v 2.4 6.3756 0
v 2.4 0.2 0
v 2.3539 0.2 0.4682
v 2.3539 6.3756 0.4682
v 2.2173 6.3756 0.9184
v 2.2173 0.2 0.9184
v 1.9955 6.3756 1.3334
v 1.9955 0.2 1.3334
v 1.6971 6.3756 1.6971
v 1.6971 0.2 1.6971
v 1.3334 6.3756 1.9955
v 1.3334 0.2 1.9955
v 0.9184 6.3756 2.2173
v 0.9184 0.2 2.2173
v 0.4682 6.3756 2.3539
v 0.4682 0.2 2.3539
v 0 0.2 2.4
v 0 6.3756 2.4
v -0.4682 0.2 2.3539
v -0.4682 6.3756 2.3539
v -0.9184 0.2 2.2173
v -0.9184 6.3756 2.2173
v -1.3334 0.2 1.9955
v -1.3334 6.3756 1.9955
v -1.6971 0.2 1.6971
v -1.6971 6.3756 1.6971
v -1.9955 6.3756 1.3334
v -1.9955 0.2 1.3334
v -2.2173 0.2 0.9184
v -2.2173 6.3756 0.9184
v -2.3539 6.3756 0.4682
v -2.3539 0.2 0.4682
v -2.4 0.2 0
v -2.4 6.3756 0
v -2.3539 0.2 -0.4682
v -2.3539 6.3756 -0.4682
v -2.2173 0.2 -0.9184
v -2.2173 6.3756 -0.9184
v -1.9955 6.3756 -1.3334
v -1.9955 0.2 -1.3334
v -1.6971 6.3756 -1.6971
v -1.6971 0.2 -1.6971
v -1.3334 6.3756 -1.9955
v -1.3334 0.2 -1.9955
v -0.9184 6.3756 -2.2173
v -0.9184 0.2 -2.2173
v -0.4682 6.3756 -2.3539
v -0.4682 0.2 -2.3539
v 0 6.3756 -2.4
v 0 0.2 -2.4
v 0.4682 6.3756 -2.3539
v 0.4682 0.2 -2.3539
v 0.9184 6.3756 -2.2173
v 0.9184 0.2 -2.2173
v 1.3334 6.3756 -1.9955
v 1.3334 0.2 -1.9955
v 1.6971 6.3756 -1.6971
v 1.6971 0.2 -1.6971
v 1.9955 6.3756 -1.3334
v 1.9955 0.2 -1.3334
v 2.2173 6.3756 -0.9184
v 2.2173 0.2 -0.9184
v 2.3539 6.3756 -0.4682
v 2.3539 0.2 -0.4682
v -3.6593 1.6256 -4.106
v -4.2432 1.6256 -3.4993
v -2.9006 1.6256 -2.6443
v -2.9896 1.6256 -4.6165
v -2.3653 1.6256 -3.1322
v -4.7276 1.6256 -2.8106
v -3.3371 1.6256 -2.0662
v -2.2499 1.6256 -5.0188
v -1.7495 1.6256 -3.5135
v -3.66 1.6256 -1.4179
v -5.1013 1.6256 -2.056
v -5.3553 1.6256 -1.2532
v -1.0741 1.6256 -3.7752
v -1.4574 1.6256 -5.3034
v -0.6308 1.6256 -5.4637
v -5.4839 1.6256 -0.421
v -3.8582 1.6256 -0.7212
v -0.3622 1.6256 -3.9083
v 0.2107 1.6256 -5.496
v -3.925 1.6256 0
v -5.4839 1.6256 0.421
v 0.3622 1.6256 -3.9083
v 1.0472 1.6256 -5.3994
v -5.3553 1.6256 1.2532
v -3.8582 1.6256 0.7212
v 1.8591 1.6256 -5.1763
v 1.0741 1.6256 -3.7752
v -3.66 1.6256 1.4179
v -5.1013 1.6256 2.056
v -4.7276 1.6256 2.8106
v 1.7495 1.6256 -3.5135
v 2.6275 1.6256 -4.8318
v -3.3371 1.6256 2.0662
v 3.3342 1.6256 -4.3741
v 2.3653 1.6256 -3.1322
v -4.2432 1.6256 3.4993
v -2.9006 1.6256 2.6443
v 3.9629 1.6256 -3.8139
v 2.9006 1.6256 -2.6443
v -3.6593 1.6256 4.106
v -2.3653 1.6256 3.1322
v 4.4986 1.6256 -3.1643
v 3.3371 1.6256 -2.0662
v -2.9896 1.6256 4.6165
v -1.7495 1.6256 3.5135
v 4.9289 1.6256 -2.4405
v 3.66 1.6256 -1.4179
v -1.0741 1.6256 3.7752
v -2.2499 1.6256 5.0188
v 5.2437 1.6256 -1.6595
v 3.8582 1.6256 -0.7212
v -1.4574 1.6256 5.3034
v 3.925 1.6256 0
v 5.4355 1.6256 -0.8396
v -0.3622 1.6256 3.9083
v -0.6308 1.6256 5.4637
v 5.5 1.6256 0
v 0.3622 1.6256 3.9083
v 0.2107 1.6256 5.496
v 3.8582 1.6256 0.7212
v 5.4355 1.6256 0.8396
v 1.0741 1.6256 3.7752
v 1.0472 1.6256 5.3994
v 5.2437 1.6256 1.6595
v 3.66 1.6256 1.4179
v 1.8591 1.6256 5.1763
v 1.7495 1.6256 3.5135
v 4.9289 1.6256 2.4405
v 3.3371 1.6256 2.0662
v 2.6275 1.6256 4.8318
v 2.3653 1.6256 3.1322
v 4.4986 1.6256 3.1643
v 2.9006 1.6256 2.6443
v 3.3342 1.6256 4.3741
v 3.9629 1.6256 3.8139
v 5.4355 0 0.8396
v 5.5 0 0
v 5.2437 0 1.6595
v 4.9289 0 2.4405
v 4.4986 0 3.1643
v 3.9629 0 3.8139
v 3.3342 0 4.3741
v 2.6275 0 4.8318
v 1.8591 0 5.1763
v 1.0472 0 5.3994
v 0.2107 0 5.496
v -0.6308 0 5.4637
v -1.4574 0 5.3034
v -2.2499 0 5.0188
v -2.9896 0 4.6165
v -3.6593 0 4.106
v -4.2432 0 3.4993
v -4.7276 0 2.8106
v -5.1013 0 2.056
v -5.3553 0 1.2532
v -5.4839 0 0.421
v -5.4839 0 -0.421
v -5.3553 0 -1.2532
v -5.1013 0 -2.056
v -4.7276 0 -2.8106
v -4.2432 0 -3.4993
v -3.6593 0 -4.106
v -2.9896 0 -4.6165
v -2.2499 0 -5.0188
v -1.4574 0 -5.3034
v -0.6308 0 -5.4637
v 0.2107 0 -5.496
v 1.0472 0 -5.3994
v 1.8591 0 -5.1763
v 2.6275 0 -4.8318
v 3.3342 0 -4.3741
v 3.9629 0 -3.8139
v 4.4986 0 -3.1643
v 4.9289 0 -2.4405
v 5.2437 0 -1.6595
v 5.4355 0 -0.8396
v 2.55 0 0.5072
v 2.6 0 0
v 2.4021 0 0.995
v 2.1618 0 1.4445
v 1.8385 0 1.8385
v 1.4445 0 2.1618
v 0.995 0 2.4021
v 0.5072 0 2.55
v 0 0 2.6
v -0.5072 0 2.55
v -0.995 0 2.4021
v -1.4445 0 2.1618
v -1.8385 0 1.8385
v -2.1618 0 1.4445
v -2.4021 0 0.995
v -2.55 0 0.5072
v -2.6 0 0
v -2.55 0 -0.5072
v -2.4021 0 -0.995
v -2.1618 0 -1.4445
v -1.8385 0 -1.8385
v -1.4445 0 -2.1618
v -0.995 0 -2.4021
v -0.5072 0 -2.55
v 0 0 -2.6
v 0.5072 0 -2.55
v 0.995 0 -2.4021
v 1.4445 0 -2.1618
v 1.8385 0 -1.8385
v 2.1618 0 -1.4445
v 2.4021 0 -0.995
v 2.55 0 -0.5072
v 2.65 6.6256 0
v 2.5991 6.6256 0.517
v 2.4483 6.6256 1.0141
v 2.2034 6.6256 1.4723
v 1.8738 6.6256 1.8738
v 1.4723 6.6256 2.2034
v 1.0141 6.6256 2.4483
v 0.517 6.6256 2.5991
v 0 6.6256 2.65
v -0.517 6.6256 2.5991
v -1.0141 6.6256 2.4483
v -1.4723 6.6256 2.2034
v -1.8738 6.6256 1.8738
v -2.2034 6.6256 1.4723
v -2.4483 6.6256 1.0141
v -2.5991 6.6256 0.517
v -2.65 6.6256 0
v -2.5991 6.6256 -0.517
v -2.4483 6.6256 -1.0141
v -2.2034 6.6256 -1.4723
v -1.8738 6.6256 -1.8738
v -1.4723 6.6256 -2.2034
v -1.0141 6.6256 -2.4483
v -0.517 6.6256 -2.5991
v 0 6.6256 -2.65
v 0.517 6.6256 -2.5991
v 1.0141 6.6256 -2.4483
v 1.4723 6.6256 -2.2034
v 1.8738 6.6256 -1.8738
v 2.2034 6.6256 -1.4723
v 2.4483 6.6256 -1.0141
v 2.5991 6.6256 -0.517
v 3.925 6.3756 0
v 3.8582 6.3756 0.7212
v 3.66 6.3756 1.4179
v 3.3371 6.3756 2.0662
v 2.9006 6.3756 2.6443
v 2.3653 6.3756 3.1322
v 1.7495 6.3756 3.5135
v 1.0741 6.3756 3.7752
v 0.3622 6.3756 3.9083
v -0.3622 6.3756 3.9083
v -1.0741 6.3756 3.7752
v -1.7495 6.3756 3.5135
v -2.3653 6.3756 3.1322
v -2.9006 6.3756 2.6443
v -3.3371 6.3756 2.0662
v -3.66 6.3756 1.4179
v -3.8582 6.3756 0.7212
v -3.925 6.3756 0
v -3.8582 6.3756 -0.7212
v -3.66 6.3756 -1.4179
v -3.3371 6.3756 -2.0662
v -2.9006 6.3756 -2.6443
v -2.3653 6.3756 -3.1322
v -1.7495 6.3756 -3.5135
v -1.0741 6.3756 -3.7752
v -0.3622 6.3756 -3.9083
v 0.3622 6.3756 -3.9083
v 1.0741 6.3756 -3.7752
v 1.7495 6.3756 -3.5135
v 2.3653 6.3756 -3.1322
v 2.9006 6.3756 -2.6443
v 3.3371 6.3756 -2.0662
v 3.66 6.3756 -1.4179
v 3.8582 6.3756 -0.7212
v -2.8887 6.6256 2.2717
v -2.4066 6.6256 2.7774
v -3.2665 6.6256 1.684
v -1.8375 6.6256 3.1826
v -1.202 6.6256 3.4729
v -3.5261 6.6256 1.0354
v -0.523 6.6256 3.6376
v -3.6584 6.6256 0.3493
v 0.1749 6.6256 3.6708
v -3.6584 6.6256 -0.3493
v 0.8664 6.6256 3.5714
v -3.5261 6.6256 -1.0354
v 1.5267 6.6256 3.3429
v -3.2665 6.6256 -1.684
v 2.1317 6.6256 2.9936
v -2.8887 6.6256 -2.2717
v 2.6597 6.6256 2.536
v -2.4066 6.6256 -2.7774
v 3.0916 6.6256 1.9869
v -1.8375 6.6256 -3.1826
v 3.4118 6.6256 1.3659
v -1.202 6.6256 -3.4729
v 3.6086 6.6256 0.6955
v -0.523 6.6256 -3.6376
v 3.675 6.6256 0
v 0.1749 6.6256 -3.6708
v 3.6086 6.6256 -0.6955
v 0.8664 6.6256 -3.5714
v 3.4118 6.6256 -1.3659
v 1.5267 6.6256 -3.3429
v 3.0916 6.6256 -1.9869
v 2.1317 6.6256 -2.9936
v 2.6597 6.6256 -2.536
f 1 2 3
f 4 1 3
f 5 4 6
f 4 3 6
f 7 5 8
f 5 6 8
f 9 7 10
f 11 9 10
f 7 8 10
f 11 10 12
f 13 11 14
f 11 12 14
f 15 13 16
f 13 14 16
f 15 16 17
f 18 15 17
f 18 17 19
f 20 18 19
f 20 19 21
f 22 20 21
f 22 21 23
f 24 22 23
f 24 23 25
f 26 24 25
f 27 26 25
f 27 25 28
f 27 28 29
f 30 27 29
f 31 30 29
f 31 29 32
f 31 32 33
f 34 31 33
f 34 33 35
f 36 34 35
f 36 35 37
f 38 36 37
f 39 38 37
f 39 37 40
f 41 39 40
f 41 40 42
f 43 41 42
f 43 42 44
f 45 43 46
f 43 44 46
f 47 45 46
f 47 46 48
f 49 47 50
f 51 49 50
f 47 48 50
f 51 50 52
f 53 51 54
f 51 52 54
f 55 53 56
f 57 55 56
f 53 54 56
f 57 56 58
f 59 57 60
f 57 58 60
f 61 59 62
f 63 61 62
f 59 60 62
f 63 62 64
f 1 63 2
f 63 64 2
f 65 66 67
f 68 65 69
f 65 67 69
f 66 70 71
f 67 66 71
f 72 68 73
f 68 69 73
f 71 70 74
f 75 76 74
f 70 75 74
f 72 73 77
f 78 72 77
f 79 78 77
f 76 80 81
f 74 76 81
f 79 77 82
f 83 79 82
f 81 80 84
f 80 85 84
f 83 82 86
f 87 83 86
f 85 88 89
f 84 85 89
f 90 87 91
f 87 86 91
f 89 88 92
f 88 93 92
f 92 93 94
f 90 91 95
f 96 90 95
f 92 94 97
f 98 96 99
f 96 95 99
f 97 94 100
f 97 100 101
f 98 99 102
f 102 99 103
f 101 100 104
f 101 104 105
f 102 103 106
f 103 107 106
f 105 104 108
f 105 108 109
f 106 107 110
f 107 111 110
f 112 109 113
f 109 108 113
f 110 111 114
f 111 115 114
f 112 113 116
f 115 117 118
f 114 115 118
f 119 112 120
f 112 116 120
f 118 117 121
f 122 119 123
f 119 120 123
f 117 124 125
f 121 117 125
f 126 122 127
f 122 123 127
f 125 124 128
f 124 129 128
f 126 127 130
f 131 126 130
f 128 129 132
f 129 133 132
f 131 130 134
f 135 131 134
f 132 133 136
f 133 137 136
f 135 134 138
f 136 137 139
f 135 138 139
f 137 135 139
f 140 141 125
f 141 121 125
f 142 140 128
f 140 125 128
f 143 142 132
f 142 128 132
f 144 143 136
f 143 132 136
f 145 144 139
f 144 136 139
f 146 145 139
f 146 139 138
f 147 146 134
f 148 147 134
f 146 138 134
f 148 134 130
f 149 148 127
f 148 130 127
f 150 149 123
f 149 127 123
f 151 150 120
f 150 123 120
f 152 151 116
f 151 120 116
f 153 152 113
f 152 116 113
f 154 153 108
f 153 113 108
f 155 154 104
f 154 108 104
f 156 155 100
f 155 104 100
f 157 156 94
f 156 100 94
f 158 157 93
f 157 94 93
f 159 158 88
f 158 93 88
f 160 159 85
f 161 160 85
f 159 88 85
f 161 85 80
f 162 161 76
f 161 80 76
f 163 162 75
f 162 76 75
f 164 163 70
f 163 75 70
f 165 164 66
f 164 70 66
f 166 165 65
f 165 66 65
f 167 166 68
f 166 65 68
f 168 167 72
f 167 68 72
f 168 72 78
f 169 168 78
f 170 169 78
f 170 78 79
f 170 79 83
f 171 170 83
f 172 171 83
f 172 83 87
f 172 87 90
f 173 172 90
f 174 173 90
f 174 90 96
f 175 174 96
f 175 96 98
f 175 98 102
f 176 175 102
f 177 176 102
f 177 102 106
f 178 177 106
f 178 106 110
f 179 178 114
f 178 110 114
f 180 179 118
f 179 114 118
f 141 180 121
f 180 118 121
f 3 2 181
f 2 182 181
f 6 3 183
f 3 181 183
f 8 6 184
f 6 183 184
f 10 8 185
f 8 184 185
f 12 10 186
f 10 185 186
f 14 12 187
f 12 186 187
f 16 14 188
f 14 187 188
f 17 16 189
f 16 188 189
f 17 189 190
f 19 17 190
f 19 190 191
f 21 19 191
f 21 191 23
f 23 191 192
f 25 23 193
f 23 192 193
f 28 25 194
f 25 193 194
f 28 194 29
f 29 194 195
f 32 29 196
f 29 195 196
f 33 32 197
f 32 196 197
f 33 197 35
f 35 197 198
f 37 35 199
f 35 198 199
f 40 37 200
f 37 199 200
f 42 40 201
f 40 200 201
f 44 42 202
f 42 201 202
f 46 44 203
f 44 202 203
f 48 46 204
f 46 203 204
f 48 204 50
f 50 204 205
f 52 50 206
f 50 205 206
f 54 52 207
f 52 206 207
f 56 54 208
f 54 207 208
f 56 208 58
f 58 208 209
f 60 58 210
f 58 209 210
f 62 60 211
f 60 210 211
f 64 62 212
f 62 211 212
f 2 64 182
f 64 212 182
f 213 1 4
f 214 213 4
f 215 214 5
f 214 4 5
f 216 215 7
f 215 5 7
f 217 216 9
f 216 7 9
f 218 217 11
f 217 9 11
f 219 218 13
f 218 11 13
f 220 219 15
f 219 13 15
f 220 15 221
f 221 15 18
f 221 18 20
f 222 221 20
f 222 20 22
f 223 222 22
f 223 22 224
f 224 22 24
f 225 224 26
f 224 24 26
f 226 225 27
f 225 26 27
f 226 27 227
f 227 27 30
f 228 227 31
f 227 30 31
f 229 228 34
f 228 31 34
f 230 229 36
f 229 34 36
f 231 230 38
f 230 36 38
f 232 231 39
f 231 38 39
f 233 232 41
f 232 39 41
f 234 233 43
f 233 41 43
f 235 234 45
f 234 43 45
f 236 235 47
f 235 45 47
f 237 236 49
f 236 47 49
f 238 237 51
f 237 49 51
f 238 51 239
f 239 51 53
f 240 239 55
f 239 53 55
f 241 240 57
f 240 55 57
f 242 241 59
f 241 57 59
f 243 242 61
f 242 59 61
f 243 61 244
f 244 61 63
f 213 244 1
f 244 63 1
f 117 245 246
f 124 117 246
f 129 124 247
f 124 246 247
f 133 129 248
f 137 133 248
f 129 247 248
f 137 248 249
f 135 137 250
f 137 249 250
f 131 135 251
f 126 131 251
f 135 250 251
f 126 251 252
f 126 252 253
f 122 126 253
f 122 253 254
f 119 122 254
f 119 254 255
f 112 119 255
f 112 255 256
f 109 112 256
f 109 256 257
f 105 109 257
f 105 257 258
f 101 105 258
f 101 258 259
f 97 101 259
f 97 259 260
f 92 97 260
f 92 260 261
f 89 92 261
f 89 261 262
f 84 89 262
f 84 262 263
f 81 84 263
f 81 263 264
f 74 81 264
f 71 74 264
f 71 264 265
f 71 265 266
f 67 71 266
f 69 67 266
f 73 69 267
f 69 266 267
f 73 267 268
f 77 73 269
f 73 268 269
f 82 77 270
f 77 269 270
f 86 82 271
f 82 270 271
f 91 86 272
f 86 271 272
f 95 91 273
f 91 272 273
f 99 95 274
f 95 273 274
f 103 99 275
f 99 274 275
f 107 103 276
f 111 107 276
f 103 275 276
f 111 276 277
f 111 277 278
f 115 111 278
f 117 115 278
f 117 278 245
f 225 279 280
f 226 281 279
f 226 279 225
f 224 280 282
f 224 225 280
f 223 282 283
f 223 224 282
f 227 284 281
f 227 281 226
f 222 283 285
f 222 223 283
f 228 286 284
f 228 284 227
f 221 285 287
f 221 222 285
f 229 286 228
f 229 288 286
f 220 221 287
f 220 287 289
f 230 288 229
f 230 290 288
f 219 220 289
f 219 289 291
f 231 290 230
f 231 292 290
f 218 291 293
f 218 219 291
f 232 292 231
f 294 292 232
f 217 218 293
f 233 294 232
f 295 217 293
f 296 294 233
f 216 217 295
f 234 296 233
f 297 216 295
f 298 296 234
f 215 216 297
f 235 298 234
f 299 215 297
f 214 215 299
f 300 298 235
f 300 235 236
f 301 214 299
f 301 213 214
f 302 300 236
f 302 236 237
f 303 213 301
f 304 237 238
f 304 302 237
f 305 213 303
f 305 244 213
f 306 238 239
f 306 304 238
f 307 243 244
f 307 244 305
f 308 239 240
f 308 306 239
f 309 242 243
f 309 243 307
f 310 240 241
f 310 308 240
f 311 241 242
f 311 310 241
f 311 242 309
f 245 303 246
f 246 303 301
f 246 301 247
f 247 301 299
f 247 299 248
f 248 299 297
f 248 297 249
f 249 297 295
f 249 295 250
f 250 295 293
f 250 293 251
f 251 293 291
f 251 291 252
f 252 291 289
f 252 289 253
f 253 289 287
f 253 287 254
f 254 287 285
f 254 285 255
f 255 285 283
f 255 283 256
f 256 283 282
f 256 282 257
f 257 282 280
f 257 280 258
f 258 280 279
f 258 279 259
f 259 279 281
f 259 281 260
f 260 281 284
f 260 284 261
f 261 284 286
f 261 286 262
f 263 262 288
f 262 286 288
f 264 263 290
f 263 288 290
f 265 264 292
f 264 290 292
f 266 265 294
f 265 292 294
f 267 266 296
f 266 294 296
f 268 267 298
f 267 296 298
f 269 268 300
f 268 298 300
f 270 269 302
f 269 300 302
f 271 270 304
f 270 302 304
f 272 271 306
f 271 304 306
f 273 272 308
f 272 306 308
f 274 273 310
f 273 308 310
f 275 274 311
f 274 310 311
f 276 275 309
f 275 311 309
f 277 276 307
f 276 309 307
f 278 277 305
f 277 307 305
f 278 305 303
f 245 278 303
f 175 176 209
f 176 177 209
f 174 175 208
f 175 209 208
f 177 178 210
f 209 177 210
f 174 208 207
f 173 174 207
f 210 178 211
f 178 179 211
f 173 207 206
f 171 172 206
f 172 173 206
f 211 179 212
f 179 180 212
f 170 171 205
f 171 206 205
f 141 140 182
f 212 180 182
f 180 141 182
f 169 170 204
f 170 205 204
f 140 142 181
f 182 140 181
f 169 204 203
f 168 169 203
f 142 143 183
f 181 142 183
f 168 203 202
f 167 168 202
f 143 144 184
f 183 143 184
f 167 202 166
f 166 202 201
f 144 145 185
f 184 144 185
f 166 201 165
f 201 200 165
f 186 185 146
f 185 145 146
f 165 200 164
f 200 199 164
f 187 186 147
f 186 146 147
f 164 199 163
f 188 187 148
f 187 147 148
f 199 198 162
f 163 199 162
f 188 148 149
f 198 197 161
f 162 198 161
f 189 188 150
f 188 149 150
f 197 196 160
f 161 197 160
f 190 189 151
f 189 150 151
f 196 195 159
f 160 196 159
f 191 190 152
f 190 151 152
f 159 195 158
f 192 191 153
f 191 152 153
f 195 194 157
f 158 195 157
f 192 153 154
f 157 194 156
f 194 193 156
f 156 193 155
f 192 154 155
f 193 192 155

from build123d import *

# Parameters (mm, degrees)
SKETCH2_W               = 14
SKETCH2_H               = 8
CUT_EXTRUDE1_DEPTH      = 6.5
CUT_EXTRUDE1_DEPTH_BACK = 6.5
CHAMFER1_SIZE           = 0.25


with BuildPart() as part:
    # Sketch1 → Revolve1 (revolve)
    with BuildSketch(Plane.XY):
        Polygon((3.925, 1.6256), (3.925, 12.4), (2.4, 12.4), (2.4, 0.2), (2.6, 0), (5.5, 0), (5.5, 1.6256), align=None)
    revolve(axis=Axis((0, 0, 0), (0, -1, 0)))

    # Sketch2 → Cut-Extrude1 (cut, two sides)
    with BuildSketch(Plane.XY) as cut_extrude1_sk:
        with Locations((0, 10.6256)):
            Rectangle(SKETCH2_W, SKETCH2_H)
    extrude(amount=CUT_EXTRUDE1_DEPTH, mode=Mode.SUBTRACT)
    extrude(cut_extrude1_sk.sketch, amount=-CUT_EXTRUDE1_DEPTH_BACK, mode=Mode.SUBTRACT)

    # Chamfer1
    chamfer1_edges = [part.edges().sort_by_distance(p)[0] for p in [
        (-3.925, 6.6256, 0),
        (-2.4, 6.6256, 0),
    ]]
    chamfer(chamfer1_edges, length=CHAMFER1_SIZE)


solid = part.part
